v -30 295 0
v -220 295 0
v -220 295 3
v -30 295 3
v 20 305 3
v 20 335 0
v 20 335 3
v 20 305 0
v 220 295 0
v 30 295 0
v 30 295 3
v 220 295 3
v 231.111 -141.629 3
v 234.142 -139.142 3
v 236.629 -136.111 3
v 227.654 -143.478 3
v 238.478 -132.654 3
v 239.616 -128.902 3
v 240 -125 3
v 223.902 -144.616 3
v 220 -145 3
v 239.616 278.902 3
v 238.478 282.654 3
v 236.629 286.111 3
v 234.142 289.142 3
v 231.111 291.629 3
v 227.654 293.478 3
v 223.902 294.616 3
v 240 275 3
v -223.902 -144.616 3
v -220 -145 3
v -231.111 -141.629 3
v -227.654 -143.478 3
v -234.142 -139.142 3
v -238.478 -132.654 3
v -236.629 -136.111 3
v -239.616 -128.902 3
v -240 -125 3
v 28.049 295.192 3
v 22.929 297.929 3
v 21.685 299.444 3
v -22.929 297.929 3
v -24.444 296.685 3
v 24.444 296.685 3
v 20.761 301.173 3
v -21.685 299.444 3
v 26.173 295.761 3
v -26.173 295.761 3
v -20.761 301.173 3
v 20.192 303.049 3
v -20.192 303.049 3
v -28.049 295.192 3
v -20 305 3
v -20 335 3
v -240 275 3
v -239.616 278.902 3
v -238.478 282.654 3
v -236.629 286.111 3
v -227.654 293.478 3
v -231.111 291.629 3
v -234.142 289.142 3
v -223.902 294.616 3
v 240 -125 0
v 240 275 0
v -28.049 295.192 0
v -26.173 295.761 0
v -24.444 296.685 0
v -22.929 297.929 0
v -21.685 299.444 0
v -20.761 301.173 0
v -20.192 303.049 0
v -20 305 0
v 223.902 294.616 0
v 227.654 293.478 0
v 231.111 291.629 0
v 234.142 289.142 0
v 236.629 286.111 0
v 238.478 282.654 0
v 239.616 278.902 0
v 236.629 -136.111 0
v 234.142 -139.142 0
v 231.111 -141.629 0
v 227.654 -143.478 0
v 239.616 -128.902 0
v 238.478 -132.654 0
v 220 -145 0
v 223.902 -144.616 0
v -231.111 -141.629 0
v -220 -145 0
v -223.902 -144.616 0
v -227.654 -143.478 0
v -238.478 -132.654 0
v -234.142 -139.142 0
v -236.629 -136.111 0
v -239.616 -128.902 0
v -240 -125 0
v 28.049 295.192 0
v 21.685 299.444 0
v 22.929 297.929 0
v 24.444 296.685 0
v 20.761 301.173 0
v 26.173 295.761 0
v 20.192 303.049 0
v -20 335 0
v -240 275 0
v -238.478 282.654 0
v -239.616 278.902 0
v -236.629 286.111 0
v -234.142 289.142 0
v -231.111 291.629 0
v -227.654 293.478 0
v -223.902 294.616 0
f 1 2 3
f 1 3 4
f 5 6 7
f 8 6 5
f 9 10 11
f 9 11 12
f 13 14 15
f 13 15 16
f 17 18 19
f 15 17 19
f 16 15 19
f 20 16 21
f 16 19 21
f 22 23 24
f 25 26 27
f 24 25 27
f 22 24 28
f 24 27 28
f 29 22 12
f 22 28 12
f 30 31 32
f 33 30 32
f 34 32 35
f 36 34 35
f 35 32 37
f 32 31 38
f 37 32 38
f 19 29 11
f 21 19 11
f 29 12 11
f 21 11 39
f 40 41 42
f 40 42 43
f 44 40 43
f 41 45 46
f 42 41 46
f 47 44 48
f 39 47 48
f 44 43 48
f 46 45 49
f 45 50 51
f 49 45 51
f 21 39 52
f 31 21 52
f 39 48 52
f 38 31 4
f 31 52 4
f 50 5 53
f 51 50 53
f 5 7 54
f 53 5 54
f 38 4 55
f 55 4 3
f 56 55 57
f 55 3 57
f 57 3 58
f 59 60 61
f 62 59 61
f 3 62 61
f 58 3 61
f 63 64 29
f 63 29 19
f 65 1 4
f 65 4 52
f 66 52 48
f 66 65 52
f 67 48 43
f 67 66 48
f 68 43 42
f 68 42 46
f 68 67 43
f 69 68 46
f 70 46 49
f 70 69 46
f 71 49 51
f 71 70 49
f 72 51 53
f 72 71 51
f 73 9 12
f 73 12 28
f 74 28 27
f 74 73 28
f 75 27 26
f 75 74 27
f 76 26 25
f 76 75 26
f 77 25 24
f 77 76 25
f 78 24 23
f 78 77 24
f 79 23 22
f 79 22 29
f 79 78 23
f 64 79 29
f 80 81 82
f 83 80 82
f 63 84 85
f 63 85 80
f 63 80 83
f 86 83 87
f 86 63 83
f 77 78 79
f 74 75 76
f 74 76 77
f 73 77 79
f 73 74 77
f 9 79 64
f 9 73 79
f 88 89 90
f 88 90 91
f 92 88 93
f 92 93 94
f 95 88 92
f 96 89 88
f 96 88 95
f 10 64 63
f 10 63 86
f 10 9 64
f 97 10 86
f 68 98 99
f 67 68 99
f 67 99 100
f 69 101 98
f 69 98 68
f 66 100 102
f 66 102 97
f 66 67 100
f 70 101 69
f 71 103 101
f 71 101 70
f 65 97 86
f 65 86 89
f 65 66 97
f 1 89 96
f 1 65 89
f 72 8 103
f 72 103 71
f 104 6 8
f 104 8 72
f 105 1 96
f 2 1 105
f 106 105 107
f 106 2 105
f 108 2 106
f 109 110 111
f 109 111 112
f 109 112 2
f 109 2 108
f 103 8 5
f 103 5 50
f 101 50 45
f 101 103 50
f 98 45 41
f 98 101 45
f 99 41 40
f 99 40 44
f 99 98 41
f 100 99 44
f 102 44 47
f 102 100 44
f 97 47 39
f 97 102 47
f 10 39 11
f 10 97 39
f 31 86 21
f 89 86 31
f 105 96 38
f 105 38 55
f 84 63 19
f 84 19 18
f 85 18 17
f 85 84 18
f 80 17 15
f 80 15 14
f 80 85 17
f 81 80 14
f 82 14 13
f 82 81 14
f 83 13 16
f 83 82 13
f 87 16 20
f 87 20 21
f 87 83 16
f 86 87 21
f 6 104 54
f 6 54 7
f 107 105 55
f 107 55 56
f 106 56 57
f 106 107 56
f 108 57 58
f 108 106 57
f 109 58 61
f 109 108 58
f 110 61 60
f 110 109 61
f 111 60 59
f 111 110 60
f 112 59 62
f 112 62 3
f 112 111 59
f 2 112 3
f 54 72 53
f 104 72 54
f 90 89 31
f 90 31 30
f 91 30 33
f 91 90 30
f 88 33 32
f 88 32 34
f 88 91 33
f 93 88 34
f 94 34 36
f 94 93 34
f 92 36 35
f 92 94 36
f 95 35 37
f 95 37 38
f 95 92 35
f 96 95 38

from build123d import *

# Parameters (mm, degrees)
BOSS_EXTRU_1_DEPTH = 3


with BuildPart() as part:
    # Esquisse1 → Boss.-Extru.1 (new body)
    with BuildSketch(Plane.XY):
        with BuildLine():
            Line((-220, 295), (-30, 295))
            ThreePointArc((-30, 295), (-22.928932188, 297.928932188), (-20, 305))
            Line((-20, 305), (-20, 335))
            Line((-20, 335), (20, 335))
            Line((20, 335), (20, 305))
            ThreePointArc((20, 305), (22.928932188, 297.928932188), (30, 295))
            Line((30, 295), (220, 295))
            ThreePointArc((220, 295), (234.142135624, 289.142135624), (240, 275))
            Line((240, 275), (240, -125))
            ThreePointArc((240, -125), (234.142135624, -139.142135624), (220, -145))
            Line((220, -145), (-220, -145))
            ThreePointArc((-220, -145), (-234.142135624, -139.142135624), (-240, -125))
            Line((-240, -125), (-240, 275))
            ThreePointArc((-240, 275), (-234.142135624, 289.142135624), (-220, 295))
        make_face()
    extrude(amount=BOSS_EXTRU_1_DEPTH)


solid = part.part
